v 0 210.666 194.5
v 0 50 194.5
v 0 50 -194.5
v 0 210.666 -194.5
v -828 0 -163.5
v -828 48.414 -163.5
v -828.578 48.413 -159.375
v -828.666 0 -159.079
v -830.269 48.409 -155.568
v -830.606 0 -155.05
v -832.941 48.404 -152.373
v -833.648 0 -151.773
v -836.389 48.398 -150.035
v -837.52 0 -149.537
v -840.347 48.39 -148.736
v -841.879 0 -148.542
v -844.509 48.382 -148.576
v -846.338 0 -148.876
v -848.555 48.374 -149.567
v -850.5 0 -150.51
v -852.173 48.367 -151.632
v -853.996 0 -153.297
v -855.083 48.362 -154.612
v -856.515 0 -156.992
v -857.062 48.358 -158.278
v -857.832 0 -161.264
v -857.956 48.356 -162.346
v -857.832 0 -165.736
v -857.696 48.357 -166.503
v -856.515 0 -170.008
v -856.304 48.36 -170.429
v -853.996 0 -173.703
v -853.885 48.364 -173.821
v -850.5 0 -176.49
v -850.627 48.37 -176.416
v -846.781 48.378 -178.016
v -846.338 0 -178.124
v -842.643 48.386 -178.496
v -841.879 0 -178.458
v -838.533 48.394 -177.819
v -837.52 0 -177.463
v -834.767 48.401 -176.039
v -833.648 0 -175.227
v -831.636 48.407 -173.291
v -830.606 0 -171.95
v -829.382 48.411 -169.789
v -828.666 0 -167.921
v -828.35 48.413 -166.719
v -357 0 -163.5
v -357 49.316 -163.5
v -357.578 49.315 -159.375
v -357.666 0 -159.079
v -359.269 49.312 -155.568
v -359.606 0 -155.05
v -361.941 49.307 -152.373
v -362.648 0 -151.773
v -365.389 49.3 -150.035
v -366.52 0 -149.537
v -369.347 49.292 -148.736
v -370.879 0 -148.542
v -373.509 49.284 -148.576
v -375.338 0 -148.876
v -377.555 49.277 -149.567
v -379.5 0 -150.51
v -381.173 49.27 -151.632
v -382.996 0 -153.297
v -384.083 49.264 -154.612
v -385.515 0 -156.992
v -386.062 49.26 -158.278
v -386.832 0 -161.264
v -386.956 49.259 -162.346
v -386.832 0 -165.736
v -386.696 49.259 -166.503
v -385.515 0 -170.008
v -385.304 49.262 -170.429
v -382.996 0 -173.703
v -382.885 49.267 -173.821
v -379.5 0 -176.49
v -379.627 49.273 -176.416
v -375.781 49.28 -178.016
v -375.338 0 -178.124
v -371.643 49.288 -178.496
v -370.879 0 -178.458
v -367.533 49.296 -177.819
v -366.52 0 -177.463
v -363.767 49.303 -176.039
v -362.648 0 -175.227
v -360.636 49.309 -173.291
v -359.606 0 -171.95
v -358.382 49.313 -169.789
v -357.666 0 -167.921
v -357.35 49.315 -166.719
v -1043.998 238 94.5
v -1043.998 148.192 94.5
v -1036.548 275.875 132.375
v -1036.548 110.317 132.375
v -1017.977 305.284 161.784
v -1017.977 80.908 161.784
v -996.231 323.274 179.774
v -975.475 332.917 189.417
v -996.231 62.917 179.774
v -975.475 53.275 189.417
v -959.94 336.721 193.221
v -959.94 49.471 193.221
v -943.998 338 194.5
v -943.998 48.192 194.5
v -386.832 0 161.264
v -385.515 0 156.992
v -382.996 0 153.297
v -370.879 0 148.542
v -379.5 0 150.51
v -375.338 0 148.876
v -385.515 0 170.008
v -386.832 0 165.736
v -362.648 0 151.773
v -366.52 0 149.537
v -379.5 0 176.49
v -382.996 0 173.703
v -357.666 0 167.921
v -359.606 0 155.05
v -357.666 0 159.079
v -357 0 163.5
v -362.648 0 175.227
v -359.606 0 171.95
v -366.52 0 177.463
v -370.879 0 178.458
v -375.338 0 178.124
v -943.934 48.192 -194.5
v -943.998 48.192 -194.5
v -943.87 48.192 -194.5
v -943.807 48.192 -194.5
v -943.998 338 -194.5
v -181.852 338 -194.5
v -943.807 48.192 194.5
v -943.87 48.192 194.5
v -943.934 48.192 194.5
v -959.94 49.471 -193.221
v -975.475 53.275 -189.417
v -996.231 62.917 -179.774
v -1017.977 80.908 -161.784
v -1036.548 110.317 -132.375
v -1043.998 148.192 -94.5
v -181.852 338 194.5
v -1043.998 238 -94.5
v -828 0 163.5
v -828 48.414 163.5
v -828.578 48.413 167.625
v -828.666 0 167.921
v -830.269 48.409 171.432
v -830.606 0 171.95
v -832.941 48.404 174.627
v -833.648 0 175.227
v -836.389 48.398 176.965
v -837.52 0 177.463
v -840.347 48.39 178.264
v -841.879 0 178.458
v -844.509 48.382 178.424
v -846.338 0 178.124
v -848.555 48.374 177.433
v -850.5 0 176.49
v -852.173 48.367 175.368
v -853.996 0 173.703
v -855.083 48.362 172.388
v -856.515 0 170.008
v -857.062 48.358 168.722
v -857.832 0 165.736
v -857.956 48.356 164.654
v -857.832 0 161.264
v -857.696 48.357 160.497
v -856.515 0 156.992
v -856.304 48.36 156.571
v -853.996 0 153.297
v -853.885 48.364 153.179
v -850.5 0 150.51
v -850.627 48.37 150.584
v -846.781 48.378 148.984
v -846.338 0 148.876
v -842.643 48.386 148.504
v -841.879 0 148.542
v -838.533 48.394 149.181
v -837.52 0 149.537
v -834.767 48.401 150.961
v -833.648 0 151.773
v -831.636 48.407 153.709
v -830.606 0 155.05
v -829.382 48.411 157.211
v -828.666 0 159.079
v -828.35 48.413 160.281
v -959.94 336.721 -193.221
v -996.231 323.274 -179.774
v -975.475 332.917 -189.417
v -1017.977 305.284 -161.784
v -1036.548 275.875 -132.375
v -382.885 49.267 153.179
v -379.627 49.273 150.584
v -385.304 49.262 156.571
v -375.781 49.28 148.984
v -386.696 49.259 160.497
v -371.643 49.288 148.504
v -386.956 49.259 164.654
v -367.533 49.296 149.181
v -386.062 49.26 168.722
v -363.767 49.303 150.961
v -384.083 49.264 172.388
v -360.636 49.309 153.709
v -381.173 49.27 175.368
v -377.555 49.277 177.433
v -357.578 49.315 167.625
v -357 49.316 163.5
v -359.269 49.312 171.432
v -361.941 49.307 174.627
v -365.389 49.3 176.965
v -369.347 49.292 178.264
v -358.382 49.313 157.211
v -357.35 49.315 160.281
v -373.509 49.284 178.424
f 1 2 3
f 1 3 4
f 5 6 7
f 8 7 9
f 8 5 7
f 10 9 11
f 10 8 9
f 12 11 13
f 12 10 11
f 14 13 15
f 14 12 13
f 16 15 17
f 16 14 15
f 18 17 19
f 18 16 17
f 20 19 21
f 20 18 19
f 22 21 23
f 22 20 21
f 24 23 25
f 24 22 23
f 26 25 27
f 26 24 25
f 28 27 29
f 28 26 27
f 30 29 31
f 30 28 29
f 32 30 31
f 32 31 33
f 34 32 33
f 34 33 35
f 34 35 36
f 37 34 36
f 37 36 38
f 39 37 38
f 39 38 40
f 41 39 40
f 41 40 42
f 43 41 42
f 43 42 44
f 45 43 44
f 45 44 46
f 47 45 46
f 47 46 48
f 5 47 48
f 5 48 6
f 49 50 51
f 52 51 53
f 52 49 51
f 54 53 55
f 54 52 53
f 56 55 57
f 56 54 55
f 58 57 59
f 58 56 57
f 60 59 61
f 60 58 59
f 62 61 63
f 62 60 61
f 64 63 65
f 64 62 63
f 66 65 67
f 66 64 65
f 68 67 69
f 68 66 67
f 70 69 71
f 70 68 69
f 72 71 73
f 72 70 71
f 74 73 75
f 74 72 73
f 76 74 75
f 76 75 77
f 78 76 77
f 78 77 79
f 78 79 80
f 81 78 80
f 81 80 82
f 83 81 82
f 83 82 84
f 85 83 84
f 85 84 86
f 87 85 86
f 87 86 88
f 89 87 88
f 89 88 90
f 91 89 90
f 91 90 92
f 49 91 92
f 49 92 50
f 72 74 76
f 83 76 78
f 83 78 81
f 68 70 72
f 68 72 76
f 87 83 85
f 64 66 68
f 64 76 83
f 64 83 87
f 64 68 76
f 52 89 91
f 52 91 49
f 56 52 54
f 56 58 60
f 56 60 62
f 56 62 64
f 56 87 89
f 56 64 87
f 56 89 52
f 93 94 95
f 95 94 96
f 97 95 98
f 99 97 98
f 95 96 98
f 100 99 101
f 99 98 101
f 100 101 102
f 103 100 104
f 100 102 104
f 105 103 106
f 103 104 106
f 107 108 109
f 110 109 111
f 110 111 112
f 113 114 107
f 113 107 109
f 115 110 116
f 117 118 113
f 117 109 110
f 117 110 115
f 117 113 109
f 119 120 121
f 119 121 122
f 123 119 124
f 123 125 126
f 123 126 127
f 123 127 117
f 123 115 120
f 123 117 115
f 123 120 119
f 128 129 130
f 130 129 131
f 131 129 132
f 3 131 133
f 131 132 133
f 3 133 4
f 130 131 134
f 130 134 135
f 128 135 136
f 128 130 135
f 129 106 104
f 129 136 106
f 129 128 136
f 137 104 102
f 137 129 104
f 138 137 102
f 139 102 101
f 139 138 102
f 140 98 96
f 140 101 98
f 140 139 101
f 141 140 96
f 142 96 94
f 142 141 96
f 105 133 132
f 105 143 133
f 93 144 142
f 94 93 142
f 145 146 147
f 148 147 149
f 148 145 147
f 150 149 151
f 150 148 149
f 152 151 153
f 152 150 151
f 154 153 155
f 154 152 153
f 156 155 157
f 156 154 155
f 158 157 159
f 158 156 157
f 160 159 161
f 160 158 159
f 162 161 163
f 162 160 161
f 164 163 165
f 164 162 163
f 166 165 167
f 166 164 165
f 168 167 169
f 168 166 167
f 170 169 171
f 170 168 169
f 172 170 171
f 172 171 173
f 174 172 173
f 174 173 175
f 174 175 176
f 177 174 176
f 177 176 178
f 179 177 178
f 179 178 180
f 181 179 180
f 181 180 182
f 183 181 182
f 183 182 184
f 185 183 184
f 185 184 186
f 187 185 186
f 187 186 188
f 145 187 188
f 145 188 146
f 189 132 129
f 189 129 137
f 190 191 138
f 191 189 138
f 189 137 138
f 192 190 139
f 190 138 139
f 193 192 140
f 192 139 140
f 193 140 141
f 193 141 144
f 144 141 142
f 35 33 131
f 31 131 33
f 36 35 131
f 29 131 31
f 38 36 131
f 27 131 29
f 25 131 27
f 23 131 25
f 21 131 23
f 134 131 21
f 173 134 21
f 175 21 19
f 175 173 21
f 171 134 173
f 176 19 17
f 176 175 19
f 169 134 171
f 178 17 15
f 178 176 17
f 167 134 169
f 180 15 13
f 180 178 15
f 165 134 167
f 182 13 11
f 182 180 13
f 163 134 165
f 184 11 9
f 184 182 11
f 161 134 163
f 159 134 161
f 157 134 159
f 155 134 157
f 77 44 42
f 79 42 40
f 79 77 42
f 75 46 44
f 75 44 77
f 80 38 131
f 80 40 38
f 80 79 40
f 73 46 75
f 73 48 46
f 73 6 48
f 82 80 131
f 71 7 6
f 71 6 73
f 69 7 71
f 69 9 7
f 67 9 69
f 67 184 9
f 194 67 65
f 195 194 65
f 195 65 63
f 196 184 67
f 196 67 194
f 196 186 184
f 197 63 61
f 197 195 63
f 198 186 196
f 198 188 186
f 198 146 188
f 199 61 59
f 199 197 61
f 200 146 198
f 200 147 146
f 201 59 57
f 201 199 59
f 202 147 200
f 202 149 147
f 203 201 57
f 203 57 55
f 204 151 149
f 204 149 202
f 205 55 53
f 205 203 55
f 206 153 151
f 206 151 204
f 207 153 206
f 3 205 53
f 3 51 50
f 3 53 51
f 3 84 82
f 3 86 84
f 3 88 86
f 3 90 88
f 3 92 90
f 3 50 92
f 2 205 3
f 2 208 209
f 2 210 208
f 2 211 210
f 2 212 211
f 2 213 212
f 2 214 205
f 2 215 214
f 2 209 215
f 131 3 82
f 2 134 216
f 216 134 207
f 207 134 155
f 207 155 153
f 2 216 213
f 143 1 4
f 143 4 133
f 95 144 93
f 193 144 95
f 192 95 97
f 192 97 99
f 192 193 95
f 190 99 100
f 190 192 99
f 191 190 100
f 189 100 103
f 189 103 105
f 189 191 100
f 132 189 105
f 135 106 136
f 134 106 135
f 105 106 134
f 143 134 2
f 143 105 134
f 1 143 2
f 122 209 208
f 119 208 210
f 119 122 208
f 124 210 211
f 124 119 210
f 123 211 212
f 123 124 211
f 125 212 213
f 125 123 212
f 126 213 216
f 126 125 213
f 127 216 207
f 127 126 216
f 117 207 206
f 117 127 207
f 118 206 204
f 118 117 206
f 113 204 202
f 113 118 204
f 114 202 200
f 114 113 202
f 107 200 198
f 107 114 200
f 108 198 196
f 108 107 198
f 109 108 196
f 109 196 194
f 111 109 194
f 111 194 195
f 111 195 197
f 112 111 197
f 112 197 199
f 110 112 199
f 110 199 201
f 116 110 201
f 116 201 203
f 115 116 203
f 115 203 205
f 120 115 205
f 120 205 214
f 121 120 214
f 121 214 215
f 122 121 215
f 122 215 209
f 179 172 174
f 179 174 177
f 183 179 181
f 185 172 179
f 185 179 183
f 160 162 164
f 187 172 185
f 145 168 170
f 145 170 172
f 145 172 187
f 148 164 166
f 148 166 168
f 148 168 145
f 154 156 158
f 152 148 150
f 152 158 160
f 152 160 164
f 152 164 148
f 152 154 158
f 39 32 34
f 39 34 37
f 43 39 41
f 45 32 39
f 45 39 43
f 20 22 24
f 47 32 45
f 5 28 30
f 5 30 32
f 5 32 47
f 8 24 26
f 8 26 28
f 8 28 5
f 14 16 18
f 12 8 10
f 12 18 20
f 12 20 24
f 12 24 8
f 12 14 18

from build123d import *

# Parameters (mm, degrees)
F1_DEPTH = 194.5
F2_DEPTH = 194.5
F3_R     = 15
F5_R     = 100


with BuildPart() as f1:
    # F0 (on Top) → F1 (new body)
    with BuildSketch(Plane.XY):
        Polygon((-1043.9980842894, 48), (0, 50), (0, 210.6660311301), (-181.8517538322, 338), (-1043.9980842894, 338), (-1043.9980842894, 50), align=None)
    extrude(amount=F1_DEPTH)

    # F0 (on Top) → F2 (join)
    with BuildSketch(Plane.XY):
        Polygon((-1043.9980842894, 48), (0, 50), (0, 210.6660311301), (-181.8517538322, 338), (-1043.9980842894, 338), (-1043.9980842894, 50), align=None)
    extrude(amount=-F2_DEPTH)

    # F3 (on Front) → F4 (join, up to the next surface of F1)
    with BuildSketch(Plane.XZ):
        with Locations((-843, 163.5)):
            Circle(F3_R)
        with Locations((-843, -163.5)):
            Circle(F3_R)
        with Locations((-372, 163.5)):
            Circle(F3_R)
        with Locations((-372, -163.5)):
            Circle(F3_R)
    extrude(until=Until.NEXT, dir=(0, 1, 0))

    # F5
    f5_edges = [f1.edges().sort_by_distance(p)[0] for p in [
        (-1043.998084, 338, 0),
        (-1043.998084, 193, 194.5),
        (-1043.998084, 48, 0),
        (-1043.998084, 193, -194.5),
    ]]
    fillet(f5_edges, radius=F5_R)


solid = f1.part
